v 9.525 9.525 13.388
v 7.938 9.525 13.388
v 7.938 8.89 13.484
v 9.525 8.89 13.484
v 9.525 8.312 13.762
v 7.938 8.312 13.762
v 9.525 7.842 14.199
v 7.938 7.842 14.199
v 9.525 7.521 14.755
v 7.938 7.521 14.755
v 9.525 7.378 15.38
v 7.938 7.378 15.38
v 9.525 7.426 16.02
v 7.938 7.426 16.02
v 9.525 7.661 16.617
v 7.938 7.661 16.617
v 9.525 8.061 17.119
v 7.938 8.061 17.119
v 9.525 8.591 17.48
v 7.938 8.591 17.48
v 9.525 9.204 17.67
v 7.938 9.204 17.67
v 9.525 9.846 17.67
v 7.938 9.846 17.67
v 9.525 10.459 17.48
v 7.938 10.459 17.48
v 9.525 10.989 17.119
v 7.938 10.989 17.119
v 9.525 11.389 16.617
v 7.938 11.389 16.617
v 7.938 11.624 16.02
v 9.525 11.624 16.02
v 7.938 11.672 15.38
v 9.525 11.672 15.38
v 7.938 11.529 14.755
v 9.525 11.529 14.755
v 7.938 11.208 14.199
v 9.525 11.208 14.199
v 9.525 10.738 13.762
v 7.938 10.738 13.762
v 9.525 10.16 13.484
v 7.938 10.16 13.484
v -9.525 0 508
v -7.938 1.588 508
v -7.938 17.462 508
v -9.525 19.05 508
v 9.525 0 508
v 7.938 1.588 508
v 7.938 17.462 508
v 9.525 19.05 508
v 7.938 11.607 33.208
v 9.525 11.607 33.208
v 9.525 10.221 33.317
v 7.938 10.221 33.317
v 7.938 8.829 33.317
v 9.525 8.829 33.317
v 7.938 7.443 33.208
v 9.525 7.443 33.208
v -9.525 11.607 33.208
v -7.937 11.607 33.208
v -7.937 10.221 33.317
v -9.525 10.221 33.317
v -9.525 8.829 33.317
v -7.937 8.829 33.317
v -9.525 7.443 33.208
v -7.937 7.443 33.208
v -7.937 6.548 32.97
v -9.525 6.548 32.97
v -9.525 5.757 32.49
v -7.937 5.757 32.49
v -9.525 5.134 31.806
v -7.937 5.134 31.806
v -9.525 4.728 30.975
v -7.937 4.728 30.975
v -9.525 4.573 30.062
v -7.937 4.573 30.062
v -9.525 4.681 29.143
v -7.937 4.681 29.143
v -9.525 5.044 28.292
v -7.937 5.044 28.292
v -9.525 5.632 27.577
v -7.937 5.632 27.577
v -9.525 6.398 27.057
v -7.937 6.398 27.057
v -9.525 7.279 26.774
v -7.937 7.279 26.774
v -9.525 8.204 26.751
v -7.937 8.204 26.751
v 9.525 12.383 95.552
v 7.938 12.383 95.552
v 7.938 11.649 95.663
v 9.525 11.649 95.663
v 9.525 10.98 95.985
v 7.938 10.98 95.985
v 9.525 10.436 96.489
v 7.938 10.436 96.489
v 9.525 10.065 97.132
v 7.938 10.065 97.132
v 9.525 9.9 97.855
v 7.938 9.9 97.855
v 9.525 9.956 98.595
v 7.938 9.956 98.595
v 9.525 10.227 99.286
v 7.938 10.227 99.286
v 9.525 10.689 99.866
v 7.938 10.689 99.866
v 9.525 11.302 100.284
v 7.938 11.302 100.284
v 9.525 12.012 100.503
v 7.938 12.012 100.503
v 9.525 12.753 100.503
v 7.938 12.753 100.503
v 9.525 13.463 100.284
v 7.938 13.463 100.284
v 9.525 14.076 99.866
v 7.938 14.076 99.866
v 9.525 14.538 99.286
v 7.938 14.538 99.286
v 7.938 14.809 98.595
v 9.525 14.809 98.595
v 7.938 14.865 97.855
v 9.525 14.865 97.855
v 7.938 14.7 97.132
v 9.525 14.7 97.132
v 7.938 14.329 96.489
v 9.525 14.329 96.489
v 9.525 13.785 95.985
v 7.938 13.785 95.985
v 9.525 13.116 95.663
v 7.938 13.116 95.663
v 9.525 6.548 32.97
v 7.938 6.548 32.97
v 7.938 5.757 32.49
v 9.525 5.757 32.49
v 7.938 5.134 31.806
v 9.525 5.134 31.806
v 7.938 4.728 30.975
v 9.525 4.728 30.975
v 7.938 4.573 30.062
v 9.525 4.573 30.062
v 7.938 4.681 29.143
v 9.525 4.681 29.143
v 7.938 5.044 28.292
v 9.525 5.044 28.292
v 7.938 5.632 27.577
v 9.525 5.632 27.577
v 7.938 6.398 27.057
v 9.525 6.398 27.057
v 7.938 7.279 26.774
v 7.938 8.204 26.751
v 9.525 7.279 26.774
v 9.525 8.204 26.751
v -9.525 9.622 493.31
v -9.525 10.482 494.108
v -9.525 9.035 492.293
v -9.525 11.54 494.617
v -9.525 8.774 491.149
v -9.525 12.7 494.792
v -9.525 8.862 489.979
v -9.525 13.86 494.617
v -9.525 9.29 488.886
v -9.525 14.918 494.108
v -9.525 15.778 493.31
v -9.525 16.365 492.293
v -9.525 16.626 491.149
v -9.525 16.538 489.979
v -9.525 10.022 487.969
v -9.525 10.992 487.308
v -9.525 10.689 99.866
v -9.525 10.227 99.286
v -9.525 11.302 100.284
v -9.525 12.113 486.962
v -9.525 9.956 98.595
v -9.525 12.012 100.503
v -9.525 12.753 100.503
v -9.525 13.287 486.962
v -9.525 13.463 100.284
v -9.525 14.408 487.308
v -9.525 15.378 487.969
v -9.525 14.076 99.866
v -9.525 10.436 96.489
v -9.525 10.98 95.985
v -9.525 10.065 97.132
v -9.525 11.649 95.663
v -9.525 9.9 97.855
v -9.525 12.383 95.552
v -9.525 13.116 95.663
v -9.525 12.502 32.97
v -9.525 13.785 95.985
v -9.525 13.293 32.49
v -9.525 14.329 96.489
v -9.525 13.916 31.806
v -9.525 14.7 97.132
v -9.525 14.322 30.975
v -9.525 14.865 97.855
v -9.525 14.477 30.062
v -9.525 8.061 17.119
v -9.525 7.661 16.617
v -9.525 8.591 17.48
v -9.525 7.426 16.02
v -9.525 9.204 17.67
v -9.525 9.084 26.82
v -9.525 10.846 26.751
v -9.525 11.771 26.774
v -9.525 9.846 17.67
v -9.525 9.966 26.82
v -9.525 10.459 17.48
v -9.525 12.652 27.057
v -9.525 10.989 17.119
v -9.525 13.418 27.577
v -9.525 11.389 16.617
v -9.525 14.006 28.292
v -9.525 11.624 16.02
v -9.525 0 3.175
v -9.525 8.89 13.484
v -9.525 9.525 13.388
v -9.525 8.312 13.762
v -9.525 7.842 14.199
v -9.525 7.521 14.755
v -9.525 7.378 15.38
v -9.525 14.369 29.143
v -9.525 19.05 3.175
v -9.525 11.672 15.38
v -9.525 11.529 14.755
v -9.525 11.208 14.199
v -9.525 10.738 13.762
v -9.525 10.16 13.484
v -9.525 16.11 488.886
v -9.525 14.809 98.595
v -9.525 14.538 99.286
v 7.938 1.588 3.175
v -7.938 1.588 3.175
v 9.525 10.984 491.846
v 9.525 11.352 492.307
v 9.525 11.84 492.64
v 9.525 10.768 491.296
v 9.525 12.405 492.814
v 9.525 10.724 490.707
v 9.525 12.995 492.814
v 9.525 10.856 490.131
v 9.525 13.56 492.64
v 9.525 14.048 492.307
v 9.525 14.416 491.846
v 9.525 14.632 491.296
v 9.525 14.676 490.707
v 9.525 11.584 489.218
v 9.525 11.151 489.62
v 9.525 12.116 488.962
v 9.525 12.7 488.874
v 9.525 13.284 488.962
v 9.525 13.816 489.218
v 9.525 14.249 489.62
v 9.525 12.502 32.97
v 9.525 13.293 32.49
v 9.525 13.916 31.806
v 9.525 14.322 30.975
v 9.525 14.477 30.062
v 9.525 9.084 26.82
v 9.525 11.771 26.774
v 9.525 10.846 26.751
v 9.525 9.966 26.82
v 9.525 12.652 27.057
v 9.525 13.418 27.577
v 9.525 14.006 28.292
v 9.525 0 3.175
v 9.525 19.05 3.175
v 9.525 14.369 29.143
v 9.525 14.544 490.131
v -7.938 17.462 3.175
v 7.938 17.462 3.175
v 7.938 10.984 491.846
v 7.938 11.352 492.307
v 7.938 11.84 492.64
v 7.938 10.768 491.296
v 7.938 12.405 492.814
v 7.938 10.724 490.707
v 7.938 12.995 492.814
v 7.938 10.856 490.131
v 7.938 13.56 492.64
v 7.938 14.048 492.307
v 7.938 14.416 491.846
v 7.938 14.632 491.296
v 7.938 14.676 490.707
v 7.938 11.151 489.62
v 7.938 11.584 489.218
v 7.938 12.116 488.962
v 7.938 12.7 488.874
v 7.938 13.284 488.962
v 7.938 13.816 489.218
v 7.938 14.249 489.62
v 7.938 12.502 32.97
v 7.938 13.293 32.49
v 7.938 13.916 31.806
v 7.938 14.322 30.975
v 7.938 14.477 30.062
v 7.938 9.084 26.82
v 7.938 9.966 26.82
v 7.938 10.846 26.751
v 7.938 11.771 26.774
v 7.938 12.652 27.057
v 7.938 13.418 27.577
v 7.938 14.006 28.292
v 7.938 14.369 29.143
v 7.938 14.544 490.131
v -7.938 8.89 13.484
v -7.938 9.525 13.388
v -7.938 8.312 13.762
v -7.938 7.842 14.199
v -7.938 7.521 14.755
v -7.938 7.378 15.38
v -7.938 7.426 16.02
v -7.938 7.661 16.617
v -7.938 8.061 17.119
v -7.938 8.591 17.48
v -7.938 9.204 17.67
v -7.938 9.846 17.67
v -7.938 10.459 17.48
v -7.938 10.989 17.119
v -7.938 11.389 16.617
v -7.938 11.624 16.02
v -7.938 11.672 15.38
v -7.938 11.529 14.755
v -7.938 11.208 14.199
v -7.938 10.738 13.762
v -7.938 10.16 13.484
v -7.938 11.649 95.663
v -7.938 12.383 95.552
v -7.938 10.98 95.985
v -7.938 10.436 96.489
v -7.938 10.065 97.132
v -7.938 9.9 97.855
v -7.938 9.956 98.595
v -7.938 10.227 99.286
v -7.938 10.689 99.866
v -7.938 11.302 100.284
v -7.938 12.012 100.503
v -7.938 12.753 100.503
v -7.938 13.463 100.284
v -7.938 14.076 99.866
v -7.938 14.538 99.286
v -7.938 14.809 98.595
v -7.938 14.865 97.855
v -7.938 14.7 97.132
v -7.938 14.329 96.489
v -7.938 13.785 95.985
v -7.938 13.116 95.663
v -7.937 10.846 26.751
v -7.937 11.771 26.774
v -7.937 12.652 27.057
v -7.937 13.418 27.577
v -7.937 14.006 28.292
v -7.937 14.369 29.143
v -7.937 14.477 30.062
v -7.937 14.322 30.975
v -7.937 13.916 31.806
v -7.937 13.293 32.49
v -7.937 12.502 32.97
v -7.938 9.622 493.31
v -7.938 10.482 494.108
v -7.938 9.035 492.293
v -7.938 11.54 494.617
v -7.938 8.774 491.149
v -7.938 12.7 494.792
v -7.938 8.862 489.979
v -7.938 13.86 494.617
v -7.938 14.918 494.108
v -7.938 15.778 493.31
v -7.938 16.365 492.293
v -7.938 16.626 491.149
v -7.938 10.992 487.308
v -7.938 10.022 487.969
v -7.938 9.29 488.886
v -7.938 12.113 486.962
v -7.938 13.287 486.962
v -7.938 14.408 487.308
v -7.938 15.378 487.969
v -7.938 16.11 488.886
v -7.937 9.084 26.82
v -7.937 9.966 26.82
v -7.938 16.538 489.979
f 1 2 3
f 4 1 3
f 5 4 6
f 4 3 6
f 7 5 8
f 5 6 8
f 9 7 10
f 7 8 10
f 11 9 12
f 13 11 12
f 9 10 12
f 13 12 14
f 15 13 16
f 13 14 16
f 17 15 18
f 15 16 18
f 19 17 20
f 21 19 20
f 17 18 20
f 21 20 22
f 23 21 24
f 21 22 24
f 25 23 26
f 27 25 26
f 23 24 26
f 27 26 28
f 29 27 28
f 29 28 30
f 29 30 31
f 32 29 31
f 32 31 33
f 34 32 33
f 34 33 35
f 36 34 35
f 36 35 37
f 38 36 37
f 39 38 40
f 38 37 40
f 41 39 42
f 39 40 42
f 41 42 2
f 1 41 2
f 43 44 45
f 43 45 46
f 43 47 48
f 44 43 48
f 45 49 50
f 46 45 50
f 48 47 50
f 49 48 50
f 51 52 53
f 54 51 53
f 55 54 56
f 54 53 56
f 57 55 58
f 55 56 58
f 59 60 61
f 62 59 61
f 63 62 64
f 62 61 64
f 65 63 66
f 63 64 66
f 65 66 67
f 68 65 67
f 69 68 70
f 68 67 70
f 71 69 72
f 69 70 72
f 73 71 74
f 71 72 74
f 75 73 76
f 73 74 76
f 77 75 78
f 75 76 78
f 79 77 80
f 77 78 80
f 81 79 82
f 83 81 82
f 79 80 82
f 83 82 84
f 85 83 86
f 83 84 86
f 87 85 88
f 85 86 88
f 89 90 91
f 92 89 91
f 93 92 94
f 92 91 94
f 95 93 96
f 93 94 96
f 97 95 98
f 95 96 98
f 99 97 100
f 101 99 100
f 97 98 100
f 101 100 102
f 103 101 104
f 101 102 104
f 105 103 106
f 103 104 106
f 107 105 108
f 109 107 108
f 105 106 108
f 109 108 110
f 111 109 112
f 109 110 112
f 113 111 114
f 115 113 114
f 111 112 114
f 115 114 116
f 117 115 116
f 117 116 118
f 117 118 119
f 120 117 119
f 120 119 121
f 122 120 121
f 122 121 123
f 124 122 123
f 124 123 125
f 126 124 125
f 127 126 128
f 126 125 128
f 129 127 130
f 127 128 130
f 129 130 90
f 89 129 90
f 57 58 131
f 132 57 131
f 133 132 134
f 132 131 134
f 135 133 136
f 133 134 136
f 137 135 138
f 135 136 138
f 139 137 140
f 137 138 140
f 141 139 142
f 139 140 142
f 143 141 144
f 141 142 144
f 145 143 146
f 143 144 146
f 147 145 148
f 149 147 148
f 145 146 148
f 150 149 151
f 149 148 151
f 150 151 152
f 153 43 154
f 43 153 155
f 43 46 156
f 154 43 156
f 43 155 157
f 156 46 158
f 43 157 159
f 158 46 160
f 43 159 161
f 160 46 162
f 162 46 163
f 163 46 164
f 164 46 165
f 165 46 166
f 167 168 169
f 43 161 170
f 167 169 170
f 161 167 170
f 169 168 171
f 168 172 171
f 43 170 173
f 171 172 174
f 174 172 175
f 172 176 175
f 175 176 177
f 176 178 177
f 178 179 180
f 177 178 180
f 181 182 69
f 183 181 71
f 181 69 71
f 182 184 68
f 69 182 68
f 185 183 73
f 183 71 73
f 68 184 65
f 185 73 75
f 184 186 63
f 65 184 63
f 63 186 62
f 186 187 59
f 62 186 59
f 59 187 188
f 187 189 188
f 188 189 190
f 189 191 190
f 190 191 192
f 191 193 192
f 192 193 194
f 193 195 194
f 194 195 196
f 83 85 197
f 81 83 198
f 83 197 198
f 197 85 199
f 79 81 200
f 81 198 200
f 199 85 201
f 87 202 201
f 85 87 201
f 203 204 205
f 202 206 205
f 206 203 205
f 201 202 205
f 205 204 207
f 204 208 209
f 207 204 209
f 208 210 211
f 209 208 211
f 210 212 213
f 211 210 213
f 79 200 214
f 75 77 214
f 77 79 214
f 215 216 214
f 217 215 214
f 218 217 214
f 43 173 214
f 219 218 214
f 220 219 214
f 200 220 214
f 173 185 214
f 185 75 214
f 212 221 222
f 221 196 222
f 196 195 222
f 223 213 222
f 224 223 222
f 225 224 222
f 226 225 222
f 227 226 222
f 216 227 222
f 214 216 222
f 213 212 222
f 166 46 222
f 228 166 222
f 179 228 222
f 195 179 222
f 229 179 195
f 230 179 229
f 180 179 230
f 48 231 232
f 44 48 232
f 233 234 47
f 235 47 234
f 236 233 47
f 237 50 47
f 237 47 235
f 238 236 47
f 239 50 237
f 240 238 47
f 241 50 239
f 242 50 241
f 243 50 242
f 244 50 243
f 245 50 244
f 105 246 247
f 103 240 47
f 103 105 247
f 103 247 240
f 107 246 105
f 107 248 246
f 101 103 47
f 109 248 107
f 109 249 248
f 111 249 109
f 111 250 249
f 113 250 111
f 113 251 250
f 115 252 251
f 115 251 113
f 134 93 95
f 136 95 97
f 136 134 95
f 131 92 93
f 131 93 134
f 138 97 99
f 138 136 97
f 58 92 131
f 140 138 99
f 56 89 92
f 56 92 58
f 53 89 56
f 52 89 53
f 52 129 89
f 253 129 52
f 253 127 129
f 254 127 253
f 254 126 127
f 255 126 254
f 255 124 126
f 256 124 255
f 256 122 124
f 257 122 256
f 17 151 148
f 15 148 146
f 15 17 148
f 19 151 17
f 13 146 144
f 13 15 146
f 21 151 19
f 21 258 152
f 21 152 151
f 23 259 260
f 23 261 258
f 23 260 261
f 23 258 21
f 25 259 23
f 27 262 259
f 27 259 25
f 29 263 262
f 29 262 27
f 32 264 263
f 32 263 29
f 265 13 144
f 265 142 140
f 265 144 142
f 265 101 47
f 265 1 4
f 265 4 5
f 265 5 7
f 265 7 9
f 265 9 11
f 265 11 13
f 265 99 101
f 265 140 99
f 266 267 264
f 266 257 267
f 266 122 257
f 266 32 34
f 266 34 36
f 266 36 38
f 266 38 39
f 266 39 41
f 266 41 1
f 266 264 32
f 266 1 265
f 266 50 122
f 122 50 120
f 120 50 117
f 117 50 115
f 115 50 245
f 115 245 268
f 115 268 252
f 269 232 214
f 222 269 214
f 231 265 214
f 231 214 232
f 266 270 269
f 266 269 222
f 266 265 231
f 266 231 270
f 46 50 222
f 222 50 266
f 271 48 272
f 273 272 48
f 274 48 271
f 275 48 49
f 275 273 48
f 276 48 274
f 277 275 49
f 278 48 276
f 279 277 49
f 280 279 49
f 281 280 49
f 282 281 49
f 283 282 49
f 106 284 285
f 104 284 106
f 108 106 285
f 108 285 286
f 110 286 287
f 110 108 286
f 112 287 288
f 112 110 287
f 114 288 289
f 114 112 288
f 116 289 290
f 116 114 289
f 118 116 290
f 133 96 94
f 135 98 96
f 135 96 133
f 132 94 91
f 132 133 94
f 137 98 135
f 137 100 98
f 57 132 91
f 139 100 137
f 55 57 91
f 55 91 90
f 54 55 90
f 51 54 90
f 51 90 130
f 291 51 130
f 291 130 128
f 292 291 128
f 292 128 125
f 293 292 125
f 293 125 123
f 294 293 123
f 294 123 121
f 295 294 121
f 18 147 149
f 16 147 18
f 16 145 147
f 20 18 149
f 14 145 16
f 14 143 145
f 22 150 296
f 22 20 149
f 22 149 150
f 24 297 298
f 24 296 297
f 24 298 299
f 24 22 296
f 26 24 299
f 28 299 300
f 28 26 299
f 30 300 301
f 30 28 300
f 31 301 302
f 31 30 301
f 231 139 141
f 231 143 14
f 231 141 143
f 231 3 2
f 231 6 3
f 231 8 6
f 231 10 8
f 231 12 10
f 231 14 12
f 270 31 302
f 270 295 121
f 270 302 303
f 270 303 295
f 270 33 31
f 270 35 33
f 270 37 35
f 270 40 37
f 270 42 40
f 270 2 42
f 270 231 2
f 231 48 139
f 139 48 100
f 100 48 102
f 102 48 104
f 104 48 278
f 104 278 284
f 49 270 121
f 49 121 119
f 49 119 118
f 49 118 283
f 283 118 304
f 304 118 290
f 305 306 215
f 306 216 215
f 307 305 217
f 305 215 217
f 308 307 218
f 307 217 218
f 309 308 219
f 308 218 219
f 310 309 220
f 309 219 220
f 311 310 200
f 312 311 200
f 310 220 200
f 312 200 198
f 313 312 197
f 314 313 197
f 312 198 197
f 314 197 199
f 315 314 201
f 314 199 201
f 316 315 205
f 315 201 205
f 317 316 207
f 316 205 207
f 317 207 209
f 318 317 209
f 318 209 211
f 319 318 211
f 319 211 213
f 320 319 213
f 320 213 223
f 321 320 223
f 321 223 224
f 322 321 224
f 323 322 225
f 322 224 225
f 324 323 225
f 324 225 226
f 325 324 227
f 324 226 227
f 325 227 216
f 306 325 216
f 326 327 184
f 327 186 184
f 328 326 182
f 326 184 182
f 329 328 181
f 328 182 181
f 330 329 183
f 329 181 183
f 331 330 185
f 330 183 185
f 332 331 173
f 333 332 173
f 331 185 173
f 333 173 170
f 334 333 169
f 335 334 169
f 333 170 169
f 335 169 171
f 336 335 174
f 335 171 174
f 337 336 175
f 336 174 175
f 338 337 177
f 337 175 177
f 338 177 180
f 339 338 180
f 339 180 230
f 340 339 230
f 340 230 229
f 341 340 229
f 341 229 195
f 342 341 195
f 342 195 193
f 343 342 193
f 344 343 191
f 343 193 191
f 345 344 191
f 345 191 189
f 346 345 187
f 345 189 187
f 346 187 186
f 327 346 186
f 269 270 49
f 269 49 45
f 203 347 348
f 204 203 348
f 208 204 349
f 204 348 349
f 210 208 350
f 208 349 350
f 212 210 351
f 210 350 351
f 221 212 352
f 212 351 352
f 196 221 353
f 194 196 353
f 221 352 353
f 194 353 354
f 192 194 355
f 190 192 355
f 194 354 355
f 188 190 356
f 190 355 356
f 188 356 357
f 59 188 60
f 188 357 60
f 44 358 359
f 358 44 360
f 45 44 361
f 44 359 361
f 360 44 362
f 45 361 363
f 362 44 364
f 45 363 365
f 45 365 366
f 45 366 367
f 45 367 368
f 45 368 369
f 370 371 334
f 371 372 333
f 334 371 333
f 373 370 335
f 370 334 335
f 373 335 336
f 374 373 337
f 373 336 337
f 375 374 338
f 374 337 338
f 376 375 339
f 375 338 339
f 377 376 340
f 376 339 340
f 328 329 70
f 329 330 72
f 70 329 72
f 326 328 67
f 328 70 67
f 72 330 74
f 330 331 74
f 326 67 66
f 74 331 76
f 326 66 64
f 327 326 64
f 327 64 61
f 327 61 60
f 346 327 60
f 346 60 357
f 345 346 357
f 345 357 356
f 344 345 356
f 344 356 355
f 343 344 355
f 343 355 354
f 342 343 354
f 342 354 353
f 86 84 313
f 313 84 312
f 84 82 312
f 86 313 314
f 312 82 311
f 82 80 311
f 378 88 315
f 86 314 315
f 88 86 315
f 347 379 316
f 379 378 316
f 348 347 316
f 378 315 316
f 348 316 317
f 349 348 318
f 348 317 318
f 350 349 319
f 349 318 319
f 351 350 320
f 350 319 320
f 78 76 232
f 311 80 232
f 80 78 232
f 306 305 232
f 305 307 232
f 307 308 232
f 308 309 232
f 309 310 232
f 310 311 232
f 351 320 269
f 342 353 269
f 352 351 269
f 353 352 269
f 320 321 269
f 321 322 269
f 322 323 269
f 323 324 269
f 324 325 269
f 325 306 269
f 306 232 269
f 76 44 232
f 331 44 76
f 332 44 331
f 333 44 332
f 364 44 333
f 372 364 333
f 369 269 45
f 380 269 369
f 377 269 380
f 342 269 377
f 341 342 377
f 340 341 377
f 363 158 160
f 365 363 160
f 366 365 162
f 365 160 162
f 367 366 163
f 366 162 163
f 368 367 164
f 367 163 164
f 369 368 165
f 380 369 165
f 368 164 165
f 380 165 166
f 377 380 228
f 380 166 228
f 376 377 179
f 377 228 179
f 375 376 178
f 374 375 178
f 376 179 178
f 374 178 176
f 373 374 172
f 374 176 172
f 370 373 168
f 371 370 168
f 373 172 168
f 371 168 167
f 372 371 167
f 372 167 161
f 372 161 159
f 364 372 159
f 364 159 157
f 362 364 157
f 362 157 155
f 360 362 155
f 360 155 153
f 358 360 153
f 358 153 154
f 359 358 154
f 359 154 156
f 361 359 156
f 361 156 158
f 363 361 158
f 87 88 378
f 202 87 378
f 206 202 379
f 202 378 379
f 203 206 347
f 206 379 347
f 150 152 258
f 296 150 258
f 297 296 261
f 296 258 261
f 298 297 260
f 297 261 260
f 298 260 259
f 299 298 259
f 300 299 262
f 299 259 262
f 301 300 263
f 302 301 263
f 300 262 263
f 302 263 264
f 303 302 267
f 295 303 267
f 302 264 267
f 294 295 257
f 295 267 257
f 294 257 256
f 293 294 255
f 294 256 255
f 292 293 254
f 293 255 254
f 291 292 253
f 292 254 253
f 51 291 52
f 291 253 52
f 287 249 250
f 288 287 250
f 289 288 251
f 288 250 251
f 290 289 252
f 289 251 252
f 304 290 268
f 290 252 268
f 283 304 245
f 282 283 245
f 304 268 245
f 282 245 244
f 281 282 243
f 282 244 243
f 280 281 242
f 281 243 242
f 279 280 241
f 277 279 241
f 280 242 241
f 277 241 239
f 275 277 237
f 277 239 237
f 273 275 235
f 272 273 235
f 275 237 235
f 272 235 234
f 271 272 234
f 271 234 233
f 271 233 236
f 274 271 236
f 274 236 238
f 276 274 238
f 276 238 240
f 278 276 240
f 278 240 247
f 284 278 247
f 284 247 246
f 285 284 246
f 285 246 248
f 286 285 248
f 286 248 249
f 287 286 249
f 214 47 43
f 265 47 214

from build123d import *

# Parameters (mm, degrees)
SKETCH2_R                       = 5.1435
SKETCH2_R_2                     = 3.175
BOSS_EXTRUDE1_DEPTH             = 9.525
SKETCH3_W                       = 504.825
SKETCH3_H                       = 19.05
BOSS_EXTRUDE2_DEPTH             = 19.05
BOSS_EXTRUDE4_START             = 0.9525
SKETCH5_R                       = 2.3622
BOSS_EXTRUDE4_DEPTH             = 4.7625
CUT_EXTRUDE6_DEPTH              = 643.110605912
SKETCH13_W                      = 2.4892
SKETCH13_H                      = 24.765
F_10_CLEARANCE_HOLE1_AT_2_COUNT = 2
F_10_CLEARANCE_HOLE1_AT_2_PITCH = 107.93330862
F_10_CLEARANCE_HOLE1_AT_3_COUNT = 2
F_10_CLEARANCE_HOLE1_AT_3_PITCH = 50.83905952
SKETCH19_W                      = 2.15265
SKETCH19_H                      = 24.765
F_8_CLEARANCE_HOLE1_AT_2_COUNT  = 2
F_8_CLEARANCE_HOLE1_AT_2_PITCH  = 14.538502572
SKETCH21_W                      = 15.875
SKETCH21_H                      = 15.875
CUT_EXTRUDE5_DEPTH              = 645.986539181
FILLET1_R                       = 2.032
FILLET2_R                       = 3.175
FILLET3_R                       = 7.62
CUT_EXTRUDE8_REACH              = 510.714
SKETCH24_R                      = 1.9812
CUT_EXTRUDE12_REACH             = 510.714
SKETCH29_R                      = 3.937


with BuildPart() as part:
    # Sketch2 → Boss-Extrude1 (new, symmetric)
    with BuildSketch(Plane(origin=(0, 0, 0), x_dir=(0, 0, -1), z_dir=(1, 0, 0))):
        with BuildLine():
            Line((0, 0), (0, 19.05))
            Line((0, 19.05), (5.08, 19.05))
            Line((5.08, 19.05), (5.08, 9.12002091))
            ThreePointArc((5.08, 9.12002091), (8.240423276, 4.635073149), (13.527141803, 6.102601311))
            Line((13.527141803, 6.102601311), (24.13, 19.05))
            Line((24.13, 19.05), (641.35, 19.05))
            Line((641.35, 19.05), (641.35, 0))
            Line((641.35, 0), (0, 0))
        make_face()
        with Locations(Location((60.6425, 11.1125, 0), (0, 0, 180))):
            Circle(SKETCH2_R, mode=Mode.SUBTRACT)
        with Locations(Location((111.4425, 10.744324516, 0), (0, 0, 180))):
            Circle(SKETCH2_R_2, mode=Mode.SUBTRACT)
    extrude(amount=BOSS_EXTRUDE1_DEPTH, both=True)


with BuildPart() as body_2:
    # Sketch3 → Boss-Extrude2 (new body)
    with BuildSketch(Plane(origin=(9.525, 0, 0), x_dir=(0, 0, -1), z_dir=(1, 0, 0))):
        with Locations((-255.5875, 9.525)):
            Rectangle(SKETCH3_W, SKETCH3_H)
        with BuildLine():
            ThreePointArc((-26.750669413, 10.846231772), (-29.598950711, 14.455649526), (-33.208368465, 11.607368228))
            ThreePointArc((-33.208368465, 11.607368228), (-33.330664319, 9.525), (-33.208368465, 7.442631772))
            ThreePointArc((-33.208368465, 7.442631772), (-29.598950711, 4.594350474), (-26.750669413, 8.203768228))
            ThreePointArc((-26.750669413, 8.203768228), (-26.828264319, 9.525), (-26.750669413, 10.846231772))
        make_face(mode=Mode.SUBTRACT)
    extrude(amount=-BOSS_EXTRUDE2_DEPTH)


with BuildPart() as body_3:
    # Sketch5 → Boss-Extrude4 (new body)
    with BuildSketch(Plane(origin=(9.525, 0, 0), x_dir=(0, 0, -1), z_dir=(1, 0, 0)).offset(BOSS_EXTRUDE4_START)):
        with BuildLine():
            Line((-109.232195108, 19.05), (-109.232195108, 0))
            Line((-109.232195108, 0), (127.635, 0))
            Line((127.635, 0), (127.635, 8.314107432))
            Line((127.635, 8.314107432), (127.635, 19.05))
            Line((127.635, 19.05), (116.205, 19.05))
            Line((116.205, 19.05), (114.64451478, 10.1809394))
            ThreePointArc((114.64451478, 10.1809394), (111.768043442, 7.509463946), (108.416949201, 9.554222083))
            Line((108.416949201, 9.554222083), (106.68, 13.97))
            Line((106.68, 13.97), (100.6475, 13.97))
            Line((100.6475, 13.97), (100.6475, 19.05))
            Line((100.6475, 19.05), (-92.691910554, 19.05))
            ThreePointArc((-92.691910554, 19.05), (-93.03686413, 15.638889171), (-93.231074764, 12.215885769))
            ThreePointArc((-93.231074764, 12.215885769), (-98.208104423, 7.572084572), (-102.85190562, 12.549114231))
            ThreePointArc((-102.85190562, 12.549114231), (-102.678331807, 15.803927129), (-102.383466098, 19.05))
            Line((-102.383466098, 19.05), (-109.232195108, 19.05))
        make_face()
        with Locations(Location((-15.540961747, 9.525, 0), (0, 0, 180))):
            Circle(SKETCH5_R, mode=Mode.SUBTRACT)
    extrude(amount=BOSS_EXTRUDE4_DEPTH)

    # Sketch22 → Cut-Extrude6 (cut, through all)
    with BuildSketch(Plane(origin=(15.24, 0, 0), x_dir=(0, 0, -1), z_dir=(1, 0, 0))):
        Polygon((-93.370680711, 11.220004545), (-91.421910554, 19.05), (-97.537688326, 22.971636797), (-103.653466098, 19.05), (-109.232195108, 19.05), (-109.232195108, 17.78), (-103.507382665, 17.78), (-102.823260211, 11.832470568), align=None)
    extrude(amount=-CUT_EXTRUDE6_DEPTH, mode=Mode.SUBTRACT)

    # Sketch13 → #10 Clearance Hole1 (revolve, cut)
    with BuildSketch(Plane(origin=(15.24, 9.12002091, -9.8425), x_dir=(0, 0, -1), z_dir=(0, 1, 0))):
        with Locations((1.2446, 12.3825)):
            Rectangle(SKETCH13_W, SKETCH13_H)
    f_10_clearance_hole1 = revolve(axis=Axis((21.59, 9.12002091, -9.8425), (-1, 0, 0)), mode=Mode.SUBTRACT)

    # #10 Clearance Hole1 at 3: #10 Clearance Hole1 ×2
    with Locations(*[Vector(0, 0.03919189515398232, -0.9992317025366236) * (i * F_10_CLEARANCE_HOLE1_AT_3_PITCH) for i in range(1, F_10_CLEARANCE_HOLE1_AT_3_COUNT)]):
        add(f_10_clearance_hole1, mode=Mode.SUBTRACT)

    # Sketch19 → #8 Clearance Hole1 (revolve, cut)
    with BuildSketch(Plane(origin=(15.24, 11.2268, 29.979518939), x_dir=(0, 0, -1), z_dir=(0, 1, 0))):
        with Locations((1.076325, 12.3825)):
            Rectangle(SKETCH19_W, SKETCH19_H)
    f_8_clearance_hole1 = revolve(axis=Axis((21.59, 11.2268, 29.979518939), (-1, 0, 0)), mode=Mode.SUBTRACT)

    # Fillet1
    fillet1_edges = [body_3.edges().sort_by_distance(p)[0] for p in [
        (12.85875, 13.97, -106.68),
        (12.85875, 19.05, -116.205),
        (12.85875, 19.05, -127.635),
        (12.85875, 0, -127.635),
        (12.85875, 17.78, 109.232195108),
        (12.85875, 17.78, 103.507382665),
        (12.85875, 19.05, 91.421910554),
    ]]
    fillet(fillet1_edges, radius=FILLET1_R)

    # Fillet2
    fillet2_edges = [body_3.edges().sort_by_distance(p)[0] for p in [
        (12.85875, 13.97, -100.6475),
    ]]
    fillet(fillet2_edges, radius=FILLET2_R)

    # Fillet3
    fillet3_edges = [body_3.edges().sort_by_distance(p)[0] for p in [
        (12.85875, 19.05, -100.6475),
    ]]
    fillet(fillet3_edges, radius=FILLET3_R)


with BuildPart() as body_2_1:
    add(body_2.part)

    # #10 Clearance Hole1 at 2: #10 Clearance Hole1 ×2
    with Locations(*[Vector(0, 0.030226805164900904, 0.9995430657302982) * (i * F_10_CLEARANCE_HOLE1_AT_2_PITCH) for i in range(1, F_10_CLEARANCE_HOLE1_AT_2_COUNT)]):
        add(f_10_clearance_hole1, mode=Mode.SUBTRACT)

    # #8 Clearance Hole1 at 2: #8 Clearance Hole1 ×2
    with Locations(*[Vector(0, -0.11705469608097882, -0.9931254694777442) * (i * F_8_CLEARANCE_HOLE1_AT_2_PITCH) for i in range(1, F_8_CLEARANCE_HOLE1_AT_2_COUNT)]):
        add(f_8_clearance_hole1, mode=Mode.SUBTRACT)

    # Sketch21 → Cut-Extrude5 (cut, through all)
    with BuildSketch(Plane(origin=(0, 0, 3.175), x_dir=(-1, 0, 0), z_dir=(0, 0, -1))):
        with Locations((0, 9.525)):
            Rectangle(SKETCH21_W, SKETCH21_H)
    extrude(amount=-CUT_EXTRUDE5_DEPTH, mode=Mode.SUBTRACT)

    # Sketch24 → Cut-Extrude8 (cut, up to next)
    with BuildSketch(Plane(origin=(9.525, 0, 0), x_dir=(0, 0, -1), z_dir=(1, 0, 0)), mode=Mode.PRIVATE) as cut_extrude8_sk1:
        with Locations((-490.855, 12.7)):
            Circle(SKETCH24_R)
    cut_extrude8_tool1 = extrude(cut_extrude8_sk1.sketch, amount=-CUT_EXTRUDE8_REACH, mode=Mode.PRIVATE) & body_2_1.part
    add(cut_extrude8_tool1.solids().sort_by_distance((9.525, 12.7, 490.855))[0], mode=Mode.SUBTRACT)

    # Sketch29 → Cut-Extrude12 (cut, up to next)
    with BuildSketch(Plane.ZY.offset(9.525), mode=Mode.PRIVATE) as cut_extrude12_sk1:
        with Locations((490.855, 12.7)):
            Circle(SKETCH29_R)
    cut_extrude12_tool1 = extrude(cut_extrude12_sk1.sketch, amount=-CUT_EXTRUDE12_REACH, mode=Mode.PRIVATE) & body_2_1.part
    add(cut_extrude12_tool1.solids().sort_by_distance((-9.525, 12.7, 490.855))[0], mode=Mode.SUBTRACT)


solid = body_2_1.part
